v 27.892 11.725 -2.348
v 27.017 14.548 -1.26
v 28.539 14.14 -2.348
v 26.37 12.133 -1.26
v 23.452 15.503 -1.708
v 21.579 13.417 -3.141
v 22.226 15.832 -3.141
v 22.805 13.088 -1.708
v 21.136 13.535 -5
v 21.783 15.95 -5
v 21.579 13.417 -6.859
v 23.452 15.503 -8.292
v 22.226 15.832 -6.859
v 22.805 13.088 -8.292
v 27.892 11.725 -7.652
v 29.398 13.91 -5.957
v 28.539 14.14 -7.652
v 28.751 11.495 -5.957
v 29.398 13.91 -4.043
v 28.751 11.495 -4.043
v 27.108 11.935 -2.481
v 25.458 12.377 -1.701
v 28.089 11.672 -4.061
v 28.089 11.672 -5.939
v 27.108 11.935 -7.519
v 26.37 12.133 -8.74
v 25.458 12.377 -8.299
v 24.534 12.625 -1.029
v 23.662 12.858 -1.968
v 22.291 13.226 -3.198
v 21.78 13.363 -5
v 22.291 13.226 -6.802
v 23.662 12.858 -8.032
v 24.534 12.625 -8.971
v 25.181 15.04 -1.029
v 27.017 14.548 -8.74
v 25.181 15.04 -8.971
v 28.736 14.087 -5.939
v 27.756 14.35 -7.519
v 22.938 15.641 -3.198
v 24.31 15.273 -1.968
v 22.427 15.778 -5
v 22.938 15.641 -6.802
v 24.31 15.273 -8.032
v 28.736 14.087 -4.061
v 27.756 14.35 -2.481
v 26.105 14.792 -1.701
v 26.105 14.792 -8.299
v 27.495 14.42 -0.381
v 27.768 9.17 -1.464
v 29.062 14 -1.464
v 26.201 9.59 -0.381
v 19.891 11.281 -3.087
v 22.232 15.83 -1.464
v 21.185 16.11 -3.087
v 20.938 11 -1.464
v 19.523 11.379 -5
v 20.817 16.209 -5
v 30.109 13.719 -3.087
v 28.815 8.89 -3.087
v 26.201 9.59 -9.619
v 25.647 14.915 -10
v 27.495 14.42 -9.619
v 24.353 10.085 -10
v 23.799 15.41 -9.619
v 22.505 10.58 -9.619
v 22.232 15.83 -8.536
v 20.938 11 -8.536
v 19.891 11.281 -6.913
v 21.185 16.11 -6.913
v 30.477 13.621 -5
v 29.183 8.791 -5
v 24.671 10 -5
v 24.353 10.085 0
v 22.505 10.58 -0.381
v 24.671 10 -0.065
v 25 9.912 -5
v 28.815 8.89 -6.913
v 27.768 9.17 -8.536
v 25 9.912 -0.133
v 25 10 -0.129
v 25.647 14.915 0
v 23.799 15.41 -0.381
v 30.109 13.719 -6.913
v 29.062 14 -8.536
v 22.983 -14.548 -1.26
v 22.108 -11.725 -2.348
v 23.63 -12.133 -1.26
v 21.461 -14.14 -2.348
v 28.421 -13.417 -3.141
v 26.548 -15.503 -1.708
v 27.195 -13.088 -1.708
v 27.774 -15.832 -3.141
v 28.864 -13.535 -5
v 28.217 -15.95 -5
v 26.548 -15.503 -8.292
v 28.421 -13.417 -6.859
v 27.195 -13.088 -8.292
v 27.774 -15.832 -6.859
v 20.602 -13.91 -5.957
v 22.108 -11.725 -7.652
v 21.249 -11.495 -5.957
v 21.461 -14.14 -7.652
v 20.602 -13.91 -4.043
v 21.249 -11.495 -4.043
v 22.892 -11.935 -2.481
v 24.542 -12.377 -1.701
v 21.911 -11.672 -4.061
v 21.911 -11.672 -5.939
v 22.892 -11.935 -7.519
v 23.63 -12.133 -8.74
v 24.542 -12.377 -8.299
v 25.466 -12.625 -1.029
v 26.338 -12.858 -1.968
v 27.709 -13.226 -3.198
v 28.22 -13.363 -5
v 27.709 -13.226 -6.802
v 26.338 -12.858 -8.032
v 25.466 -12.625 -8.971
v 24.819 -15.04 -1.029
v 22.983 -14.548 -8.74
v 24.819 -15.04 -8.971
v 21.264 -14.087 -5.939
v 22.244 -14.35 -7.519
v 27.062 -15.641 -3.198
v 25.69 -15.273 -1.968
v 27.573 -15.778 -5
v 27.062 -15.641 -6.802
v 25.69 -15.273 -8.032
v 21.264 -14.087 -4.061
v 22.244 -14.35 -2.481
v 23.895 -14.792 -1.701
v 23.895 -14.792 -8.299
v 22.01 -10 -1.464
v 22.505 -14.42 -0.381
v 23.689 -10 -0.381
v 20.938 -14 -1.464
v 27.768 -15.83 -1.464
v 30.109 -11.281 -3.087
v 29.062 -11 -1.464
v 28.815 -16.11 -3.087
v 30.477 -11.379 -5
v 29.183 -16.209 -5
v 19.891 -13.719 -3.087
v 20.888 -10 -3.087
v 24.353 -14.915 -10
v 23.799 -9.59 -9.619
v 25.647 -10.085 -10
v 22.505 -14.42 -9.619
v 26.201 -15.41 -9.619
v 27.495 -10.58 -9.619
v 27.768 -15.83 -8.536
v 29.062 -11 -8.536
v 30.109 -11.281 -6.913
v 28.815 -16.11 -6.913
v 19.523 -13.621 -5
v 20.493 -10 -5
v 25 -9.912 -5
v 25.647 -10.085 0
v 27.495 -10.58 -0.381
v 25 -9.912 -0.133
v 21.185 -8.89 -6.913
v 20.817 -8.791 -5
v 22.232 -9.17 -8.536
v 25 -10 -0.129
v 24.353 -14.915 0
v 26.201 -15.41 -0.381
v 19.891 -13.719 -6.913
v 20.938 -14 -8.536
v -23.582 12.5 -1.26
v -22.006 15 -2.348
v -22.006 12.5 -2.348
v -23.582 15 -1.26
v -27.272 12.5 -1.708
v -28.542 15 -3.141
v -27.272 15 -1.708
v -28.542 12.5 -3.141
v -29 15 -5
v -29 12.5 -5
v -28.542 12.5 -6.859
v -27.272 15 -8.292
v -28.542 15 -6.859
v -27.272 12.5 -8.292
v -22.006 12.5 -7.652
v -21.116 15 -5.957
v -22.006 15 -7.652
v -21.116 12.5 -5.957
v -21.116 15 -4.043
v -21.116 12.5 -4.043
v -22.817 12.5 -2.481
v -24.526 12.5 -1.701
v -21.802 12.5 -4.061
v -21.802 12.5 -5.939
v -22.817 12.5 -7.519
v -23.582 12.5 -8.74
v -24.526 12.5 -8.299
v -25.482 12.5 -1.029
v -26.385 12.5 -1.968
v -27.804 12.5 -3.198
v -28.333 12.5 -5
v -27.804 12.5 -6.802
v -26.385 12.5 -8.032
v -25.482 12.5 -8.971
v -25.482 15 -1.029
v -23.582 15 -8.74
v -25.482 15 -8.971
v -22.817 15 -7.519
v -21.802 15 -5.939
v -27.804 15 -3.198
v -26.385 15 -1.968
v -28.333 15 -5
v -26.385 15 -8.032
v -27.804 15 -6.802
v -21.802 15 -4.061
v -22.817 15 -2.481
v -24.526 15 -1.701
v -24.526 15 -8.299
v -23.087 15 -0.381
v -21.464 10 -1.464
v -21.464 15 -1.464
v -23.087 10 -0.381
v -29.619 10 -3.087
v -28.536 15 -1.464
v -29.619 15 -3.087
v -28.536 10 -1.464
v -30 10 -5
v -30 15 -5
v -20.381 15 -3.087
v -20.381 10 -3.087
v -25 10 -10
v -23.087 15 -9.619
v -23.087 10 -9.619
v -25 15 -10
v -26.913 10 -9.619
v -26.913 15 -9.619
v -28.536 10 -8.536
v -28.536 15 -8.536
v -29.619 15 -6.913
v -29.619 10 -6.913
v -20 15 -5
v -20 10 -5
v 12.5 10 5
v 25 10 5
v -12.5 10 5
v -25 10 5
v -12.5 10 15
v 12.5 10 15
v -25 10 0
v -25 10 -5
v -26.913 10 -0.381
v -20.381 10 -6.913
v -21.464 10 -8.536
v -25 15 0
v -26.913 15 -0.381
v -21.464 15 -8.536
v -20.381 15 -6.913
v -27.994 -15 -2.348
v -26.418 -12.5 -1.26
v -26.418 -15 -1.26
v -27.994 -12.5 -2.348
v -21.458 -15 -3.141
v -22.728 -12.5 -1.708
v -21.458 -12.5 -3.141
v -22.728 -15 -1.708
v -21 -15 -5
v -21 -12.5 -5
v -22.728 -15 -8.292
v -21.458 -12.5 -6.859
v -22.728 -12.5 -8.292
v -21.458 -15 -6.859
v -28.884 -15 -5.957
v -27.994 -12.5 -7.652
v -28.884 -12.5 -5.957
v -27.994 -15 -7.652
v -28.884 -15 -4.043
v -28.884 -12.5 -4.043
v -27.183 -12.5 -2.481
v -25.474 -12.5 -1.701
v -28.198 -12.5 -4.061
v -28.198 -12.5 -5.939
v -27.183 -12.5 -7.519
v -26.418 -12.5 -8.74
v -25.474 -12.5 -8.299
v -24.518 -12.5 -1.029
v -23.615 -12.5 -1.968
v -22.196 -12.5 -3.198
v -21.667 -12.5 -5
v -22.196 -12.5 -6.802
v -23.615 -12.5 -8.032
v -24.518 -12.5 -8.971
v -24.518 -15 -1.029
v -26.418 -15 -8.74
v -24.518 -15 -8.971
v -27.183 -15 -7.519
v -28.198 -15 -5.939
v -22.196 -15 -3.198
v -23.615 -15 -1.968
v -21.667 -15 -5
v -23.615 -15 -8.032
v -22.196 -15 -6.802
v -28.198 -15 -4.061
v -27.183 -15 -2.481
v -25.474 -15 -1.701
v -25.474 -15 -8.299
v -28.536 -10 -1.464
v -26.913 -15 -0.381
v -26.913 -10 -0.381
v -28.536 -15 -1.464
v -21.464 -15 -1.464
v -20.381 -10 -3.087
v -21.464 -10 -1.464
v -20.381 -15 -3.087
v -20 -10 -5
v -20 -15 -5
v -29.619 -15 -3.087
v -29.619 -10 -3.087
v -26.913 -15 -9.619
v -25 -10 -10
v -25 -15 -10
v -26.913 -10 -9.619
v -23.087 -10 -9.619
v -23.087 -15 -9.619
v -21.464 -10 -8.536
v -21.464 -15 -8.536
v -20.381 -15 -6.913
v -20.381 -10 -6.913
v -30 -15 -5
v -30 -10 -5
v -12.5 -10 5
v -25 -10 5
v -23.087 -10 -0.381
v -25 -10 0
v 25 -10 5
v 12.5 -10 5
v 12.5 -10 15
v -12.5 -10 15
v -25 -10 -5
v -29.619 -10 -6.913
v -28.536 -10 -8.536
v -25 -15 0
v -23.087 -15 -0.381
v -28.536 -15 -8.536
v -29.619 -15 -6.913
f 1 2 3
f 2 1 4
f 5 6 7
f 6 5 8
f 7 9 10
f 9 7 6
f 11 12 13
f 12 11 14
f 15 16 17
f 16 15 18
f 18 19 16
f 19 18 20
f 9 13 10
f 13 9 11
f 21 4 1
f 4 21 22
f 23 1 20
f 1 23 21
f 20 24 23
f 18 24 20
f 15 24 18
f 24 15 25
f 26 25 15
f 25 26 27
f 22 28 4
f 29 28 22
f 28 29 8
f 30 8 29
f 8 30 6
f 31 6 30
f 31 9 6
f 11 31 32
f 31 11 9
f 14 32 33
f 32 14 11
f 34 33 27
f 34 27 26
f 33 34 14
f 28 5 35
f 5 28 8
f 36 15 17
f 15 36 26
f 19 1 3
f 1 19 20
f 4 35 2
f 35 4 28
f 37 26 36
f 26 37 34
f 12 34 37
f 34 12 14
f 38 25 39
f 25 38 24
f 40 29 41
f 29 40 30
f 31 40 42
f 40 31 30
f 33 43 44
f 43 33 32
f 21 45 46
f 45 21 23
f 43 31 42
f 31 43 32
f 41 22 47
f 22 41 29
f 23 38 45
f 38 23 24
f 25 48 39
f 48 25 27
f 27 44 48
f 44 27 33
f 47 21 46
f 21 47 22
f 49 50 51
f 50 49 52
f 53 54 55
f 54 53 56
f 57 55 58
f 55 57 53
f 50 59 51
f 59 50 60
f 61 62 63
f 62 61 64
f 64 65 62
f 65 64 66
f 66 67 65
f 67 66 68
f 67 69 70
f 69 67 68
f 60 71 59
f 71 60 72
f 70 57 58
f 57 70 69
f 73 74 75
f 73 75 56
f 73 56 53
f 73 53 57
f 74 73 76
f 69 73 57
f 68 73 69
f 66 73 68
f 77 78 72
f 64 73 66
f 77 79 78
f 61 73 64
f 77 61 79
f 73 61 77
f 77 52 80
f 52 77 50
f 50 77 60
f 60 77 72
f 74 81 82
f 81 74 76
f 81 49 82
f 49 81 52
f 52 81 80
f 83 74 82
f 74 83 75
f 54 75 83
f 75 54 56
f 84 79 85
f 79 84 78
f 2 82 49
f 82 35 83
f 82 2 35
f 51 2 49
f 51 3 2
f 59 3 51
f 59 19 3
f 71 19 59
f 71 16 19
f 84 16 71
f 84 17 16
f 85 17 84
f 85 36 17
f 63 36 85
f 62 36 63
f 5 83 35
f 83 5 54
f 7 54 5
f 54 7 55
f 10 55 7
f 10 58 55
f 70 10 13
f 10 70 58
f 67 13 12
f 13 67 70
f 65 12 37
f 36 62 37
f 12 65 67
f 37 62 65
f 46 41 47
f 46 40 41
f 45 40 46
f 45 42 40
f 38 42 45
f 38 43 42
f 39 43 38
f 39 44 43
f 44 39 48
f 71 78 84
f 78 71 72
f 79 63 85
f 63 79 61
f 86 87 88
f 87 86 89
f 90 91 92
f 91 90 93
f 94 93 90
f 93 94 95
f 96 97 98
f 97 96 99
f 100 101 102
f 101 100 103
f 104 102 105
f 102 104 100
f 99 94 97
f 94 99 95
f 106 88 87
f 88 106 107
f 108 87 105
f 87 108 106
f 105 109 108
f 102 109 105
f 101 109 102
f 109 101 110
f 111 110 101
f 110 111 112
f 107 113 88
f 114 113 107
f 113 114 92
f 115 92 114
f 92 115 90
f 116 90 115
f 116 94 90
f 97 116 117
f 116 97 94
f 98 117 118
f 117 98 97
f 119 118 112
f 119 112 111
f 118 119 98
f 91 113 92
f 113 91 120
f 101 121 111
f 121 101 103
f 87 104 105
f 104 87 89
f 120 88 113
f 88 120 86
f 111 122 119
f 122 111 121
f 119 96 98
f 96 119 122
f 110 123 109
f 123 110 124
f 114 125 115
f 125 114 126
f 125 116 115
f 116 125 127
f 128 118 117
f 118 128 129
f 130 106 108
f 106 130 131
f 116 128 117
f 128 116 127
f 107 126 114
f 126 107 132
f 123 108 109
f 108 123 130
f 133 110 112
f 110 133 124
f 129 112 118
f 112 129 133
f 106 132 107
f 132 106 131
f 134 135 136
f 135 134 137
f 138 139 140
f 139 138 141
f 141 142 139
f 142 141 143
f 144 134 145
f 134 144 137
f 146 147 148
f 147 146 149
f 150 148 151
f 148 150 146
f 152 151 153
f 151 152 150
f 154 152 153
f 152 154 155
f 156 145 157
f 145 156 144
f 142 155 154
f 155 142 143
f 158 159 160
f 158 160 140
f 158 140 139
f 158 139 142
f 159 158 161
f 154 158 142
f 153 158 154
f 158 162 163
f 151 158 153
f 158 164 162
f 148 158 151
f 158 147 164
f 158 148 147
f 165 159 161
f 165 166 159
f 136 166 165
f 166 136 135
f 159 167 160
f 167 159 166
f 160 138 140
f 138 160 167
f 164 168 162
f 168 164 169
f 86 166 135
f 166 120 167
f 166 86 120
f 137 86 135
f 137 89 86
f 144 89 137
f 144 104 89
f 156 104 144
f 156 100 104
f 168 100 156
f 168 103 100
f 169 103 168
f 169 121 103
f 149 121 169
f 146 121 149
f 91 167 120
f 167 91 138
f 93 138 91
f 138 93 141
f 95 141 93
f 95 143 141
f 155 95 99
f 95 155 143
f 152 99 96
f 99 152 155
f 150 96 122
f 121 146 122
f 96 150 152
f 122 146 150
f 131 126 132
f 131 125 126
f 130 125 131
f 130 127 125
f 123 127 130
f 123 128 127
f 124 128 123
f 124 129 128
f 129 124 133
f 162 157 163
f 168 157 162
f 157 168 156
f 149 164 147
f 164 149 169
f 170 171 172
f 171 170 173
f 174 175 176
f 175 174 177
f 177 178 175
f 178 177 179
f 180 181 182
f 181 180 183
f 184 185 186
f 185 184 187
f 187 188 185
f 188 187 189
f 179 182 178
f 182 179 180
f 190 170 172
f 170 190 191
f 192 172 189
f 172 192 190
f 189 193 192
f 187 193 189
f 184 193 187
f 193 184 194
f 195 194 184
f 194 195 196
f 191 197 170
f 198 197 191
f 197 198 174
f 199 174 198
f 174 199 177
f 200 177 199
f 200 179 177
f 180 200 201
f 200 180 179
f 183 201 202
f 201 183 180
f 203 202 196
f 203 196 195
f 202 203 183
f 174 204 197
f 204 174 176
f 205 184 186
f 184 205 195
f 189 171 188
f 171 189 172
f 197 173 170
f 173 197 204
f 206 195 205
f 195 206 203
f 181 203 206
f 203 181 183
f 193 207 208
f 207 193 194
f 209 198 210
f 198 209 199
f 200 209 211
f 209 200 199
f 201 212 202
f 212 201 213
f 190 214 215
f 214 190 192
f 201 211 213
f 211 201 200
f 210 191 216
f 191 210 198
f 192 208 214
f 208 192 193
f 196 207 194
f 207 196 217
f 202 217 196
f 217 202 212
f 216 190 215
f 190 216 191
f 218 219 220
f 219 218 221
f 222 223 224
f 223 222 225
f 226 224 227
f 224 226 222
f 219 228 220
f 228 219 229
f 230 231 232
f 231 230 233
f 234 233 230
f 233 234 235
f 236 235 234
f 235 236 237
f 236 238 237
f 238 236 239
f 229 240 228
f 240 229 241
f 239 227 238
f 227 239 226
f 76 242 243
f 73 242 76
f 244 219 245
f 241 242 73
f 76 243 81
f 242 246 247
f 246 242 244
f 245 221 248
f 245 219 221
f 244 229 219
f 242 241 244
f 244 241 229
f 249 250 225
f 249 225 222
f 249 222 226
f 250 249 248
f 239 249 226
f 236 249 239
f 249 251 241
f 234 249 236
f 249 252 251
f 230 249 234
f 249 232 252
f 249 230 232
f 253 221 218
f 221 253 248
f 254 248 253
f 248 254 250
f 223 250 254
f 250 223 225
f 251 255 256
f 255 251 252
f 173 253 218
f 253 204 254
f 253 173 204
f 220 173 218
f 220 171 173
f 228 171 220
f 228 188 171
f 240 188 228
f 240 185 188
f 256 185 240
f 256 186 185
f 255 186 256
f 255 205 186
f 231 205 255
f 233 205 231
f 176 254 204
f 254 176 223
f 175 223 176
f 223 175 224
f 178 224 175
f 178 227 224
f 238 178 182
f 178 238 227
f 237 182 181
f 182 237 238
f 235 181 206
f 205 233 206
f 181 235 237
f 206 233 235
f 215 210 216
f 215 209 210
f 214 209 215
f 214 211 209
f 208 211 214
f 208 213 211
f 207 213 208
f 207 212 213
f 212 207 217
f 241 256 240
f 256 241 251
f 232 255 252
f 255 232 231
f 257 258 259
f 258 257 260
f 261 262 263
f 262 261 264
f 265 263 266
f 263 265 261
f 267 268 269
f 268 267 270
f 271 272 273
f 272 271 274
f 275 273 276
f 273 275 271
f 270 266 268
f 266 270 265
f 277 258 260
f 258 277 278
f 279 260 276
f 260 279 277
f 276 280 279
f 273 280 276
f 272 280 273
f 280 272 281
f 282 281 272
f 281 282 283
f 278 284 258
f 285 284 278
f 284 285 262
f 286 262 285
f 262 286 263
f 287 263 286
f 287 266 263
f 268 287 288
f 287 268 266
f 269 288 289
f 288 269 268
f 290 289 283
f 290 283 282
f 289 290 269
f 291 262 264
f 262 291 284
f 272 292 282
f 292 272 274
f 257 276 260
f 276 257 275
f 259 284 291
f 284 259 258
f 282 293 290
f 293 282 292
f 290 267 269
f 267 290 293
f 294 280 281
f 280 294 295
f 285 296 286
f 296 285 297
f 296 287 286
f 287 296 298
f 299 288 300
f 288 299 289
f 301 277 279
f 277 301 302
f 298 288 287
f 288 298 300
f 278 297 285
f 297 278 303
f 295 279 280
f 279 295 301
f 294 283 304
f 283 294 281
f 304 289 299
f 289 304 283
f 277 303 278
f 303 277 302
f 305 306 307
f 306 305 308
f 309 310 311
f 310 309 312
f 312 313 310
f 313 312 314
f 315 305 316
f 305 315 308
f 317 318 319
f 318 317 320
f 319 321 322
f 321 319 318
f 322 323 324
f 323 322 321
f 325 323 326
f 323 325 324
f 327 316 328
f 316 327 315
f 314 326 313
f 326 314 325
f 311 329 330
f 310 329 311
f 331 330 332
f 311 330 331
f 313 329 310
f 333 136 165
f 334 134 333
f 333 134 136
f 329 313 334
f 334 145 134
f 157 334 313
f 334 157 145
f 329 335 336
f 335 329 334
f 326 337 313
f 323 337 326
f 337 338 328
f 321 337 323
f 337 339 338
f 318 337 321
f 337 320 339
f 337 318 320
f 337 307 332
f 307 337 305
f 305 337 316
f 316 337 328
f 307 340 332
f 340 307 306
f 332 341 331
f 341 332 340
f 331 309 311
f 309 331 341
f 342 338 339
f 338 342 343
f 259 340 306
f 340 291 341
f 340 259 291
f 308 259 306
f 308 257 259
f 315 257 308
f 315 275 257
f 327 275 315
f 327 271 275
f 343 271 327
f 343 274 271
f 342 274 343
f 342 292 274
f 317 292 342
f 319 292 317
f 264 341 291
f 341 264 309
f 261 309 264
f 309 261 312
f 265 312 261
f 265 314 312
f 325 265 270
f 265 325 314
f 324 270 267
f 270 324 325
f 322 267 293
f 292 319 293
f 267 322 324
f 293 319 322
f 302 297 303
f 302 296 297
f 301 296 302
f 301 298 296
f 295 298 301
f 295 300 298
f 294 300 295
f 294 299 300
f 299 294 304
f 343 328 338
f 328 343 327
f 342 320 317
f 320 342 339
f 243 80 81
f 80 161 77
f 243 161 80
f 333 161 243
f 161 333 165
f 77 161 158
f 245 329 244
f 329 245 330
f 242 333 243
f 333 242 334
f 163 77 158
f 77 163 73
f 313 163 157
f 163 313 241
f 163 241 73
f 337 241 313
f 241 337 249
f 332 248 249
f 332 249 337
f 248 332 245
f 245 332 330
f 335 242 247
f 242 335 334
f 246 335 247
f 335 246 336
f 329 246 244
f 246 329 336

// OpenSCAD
//parameterized car with wheel modules

$fa=1;
$fs=2;

wheel_radius = 5;
wheel_width = 5;
wheel_rotation = -15;
wheel_height = -5;

car_length = 50;
car_width = 20;
car_height = 10;

module wheel1() {
  cylinder(h=wheel_width,r=wheel_radius,center=true);
}

module wheel2() {
  difference() {
    cylinder(h=wheel_width,r=wheel_radius,center=true);
    translate([0,0,wheel_width/2])
      cylinder(h=wheel_width,r=wheel_radius/1.4,center=true);
  }
}

module wheel3() {
  difference() {
    cylinder(h=wheel_width,r=wheel_radius,center=true);
    translate([0,0,wheel_width/2])
      difference() {
      cylinder(h=wheel_width,r=wheel_radius/1.25,center=true);
      cylinder(h=wheel_width,r=wheel_radius/1.5,center=true);
    }
  }
}

module selected() {
  wheel3();
}

module car() {
  cube([car_length,car_width,car_height],center=true);

  translate([0,0,car_height])
    cube([car_length/2, car_width, car_height], center=true);

  translate([car_length/2,car_width/2+(wheel_width/2),wheel_height])
    rotate([90,0,wheel_rotation+180])
    selected();

  translate([car_length/2,-car_width/2-(wheel_width/2),wheel_height])
    rotate([90,0,wheel_rotation])
    selected();

  translate([-car_length/2,car_width/2+(wheel_width/2),wheel_height])
    rotate([90,0,180])
    selected();

  translate([-car_length/2,-car_width/2-(wheel_width/2),wheel_height])
    rotate([90,0,0])
    selected();
}
car();
